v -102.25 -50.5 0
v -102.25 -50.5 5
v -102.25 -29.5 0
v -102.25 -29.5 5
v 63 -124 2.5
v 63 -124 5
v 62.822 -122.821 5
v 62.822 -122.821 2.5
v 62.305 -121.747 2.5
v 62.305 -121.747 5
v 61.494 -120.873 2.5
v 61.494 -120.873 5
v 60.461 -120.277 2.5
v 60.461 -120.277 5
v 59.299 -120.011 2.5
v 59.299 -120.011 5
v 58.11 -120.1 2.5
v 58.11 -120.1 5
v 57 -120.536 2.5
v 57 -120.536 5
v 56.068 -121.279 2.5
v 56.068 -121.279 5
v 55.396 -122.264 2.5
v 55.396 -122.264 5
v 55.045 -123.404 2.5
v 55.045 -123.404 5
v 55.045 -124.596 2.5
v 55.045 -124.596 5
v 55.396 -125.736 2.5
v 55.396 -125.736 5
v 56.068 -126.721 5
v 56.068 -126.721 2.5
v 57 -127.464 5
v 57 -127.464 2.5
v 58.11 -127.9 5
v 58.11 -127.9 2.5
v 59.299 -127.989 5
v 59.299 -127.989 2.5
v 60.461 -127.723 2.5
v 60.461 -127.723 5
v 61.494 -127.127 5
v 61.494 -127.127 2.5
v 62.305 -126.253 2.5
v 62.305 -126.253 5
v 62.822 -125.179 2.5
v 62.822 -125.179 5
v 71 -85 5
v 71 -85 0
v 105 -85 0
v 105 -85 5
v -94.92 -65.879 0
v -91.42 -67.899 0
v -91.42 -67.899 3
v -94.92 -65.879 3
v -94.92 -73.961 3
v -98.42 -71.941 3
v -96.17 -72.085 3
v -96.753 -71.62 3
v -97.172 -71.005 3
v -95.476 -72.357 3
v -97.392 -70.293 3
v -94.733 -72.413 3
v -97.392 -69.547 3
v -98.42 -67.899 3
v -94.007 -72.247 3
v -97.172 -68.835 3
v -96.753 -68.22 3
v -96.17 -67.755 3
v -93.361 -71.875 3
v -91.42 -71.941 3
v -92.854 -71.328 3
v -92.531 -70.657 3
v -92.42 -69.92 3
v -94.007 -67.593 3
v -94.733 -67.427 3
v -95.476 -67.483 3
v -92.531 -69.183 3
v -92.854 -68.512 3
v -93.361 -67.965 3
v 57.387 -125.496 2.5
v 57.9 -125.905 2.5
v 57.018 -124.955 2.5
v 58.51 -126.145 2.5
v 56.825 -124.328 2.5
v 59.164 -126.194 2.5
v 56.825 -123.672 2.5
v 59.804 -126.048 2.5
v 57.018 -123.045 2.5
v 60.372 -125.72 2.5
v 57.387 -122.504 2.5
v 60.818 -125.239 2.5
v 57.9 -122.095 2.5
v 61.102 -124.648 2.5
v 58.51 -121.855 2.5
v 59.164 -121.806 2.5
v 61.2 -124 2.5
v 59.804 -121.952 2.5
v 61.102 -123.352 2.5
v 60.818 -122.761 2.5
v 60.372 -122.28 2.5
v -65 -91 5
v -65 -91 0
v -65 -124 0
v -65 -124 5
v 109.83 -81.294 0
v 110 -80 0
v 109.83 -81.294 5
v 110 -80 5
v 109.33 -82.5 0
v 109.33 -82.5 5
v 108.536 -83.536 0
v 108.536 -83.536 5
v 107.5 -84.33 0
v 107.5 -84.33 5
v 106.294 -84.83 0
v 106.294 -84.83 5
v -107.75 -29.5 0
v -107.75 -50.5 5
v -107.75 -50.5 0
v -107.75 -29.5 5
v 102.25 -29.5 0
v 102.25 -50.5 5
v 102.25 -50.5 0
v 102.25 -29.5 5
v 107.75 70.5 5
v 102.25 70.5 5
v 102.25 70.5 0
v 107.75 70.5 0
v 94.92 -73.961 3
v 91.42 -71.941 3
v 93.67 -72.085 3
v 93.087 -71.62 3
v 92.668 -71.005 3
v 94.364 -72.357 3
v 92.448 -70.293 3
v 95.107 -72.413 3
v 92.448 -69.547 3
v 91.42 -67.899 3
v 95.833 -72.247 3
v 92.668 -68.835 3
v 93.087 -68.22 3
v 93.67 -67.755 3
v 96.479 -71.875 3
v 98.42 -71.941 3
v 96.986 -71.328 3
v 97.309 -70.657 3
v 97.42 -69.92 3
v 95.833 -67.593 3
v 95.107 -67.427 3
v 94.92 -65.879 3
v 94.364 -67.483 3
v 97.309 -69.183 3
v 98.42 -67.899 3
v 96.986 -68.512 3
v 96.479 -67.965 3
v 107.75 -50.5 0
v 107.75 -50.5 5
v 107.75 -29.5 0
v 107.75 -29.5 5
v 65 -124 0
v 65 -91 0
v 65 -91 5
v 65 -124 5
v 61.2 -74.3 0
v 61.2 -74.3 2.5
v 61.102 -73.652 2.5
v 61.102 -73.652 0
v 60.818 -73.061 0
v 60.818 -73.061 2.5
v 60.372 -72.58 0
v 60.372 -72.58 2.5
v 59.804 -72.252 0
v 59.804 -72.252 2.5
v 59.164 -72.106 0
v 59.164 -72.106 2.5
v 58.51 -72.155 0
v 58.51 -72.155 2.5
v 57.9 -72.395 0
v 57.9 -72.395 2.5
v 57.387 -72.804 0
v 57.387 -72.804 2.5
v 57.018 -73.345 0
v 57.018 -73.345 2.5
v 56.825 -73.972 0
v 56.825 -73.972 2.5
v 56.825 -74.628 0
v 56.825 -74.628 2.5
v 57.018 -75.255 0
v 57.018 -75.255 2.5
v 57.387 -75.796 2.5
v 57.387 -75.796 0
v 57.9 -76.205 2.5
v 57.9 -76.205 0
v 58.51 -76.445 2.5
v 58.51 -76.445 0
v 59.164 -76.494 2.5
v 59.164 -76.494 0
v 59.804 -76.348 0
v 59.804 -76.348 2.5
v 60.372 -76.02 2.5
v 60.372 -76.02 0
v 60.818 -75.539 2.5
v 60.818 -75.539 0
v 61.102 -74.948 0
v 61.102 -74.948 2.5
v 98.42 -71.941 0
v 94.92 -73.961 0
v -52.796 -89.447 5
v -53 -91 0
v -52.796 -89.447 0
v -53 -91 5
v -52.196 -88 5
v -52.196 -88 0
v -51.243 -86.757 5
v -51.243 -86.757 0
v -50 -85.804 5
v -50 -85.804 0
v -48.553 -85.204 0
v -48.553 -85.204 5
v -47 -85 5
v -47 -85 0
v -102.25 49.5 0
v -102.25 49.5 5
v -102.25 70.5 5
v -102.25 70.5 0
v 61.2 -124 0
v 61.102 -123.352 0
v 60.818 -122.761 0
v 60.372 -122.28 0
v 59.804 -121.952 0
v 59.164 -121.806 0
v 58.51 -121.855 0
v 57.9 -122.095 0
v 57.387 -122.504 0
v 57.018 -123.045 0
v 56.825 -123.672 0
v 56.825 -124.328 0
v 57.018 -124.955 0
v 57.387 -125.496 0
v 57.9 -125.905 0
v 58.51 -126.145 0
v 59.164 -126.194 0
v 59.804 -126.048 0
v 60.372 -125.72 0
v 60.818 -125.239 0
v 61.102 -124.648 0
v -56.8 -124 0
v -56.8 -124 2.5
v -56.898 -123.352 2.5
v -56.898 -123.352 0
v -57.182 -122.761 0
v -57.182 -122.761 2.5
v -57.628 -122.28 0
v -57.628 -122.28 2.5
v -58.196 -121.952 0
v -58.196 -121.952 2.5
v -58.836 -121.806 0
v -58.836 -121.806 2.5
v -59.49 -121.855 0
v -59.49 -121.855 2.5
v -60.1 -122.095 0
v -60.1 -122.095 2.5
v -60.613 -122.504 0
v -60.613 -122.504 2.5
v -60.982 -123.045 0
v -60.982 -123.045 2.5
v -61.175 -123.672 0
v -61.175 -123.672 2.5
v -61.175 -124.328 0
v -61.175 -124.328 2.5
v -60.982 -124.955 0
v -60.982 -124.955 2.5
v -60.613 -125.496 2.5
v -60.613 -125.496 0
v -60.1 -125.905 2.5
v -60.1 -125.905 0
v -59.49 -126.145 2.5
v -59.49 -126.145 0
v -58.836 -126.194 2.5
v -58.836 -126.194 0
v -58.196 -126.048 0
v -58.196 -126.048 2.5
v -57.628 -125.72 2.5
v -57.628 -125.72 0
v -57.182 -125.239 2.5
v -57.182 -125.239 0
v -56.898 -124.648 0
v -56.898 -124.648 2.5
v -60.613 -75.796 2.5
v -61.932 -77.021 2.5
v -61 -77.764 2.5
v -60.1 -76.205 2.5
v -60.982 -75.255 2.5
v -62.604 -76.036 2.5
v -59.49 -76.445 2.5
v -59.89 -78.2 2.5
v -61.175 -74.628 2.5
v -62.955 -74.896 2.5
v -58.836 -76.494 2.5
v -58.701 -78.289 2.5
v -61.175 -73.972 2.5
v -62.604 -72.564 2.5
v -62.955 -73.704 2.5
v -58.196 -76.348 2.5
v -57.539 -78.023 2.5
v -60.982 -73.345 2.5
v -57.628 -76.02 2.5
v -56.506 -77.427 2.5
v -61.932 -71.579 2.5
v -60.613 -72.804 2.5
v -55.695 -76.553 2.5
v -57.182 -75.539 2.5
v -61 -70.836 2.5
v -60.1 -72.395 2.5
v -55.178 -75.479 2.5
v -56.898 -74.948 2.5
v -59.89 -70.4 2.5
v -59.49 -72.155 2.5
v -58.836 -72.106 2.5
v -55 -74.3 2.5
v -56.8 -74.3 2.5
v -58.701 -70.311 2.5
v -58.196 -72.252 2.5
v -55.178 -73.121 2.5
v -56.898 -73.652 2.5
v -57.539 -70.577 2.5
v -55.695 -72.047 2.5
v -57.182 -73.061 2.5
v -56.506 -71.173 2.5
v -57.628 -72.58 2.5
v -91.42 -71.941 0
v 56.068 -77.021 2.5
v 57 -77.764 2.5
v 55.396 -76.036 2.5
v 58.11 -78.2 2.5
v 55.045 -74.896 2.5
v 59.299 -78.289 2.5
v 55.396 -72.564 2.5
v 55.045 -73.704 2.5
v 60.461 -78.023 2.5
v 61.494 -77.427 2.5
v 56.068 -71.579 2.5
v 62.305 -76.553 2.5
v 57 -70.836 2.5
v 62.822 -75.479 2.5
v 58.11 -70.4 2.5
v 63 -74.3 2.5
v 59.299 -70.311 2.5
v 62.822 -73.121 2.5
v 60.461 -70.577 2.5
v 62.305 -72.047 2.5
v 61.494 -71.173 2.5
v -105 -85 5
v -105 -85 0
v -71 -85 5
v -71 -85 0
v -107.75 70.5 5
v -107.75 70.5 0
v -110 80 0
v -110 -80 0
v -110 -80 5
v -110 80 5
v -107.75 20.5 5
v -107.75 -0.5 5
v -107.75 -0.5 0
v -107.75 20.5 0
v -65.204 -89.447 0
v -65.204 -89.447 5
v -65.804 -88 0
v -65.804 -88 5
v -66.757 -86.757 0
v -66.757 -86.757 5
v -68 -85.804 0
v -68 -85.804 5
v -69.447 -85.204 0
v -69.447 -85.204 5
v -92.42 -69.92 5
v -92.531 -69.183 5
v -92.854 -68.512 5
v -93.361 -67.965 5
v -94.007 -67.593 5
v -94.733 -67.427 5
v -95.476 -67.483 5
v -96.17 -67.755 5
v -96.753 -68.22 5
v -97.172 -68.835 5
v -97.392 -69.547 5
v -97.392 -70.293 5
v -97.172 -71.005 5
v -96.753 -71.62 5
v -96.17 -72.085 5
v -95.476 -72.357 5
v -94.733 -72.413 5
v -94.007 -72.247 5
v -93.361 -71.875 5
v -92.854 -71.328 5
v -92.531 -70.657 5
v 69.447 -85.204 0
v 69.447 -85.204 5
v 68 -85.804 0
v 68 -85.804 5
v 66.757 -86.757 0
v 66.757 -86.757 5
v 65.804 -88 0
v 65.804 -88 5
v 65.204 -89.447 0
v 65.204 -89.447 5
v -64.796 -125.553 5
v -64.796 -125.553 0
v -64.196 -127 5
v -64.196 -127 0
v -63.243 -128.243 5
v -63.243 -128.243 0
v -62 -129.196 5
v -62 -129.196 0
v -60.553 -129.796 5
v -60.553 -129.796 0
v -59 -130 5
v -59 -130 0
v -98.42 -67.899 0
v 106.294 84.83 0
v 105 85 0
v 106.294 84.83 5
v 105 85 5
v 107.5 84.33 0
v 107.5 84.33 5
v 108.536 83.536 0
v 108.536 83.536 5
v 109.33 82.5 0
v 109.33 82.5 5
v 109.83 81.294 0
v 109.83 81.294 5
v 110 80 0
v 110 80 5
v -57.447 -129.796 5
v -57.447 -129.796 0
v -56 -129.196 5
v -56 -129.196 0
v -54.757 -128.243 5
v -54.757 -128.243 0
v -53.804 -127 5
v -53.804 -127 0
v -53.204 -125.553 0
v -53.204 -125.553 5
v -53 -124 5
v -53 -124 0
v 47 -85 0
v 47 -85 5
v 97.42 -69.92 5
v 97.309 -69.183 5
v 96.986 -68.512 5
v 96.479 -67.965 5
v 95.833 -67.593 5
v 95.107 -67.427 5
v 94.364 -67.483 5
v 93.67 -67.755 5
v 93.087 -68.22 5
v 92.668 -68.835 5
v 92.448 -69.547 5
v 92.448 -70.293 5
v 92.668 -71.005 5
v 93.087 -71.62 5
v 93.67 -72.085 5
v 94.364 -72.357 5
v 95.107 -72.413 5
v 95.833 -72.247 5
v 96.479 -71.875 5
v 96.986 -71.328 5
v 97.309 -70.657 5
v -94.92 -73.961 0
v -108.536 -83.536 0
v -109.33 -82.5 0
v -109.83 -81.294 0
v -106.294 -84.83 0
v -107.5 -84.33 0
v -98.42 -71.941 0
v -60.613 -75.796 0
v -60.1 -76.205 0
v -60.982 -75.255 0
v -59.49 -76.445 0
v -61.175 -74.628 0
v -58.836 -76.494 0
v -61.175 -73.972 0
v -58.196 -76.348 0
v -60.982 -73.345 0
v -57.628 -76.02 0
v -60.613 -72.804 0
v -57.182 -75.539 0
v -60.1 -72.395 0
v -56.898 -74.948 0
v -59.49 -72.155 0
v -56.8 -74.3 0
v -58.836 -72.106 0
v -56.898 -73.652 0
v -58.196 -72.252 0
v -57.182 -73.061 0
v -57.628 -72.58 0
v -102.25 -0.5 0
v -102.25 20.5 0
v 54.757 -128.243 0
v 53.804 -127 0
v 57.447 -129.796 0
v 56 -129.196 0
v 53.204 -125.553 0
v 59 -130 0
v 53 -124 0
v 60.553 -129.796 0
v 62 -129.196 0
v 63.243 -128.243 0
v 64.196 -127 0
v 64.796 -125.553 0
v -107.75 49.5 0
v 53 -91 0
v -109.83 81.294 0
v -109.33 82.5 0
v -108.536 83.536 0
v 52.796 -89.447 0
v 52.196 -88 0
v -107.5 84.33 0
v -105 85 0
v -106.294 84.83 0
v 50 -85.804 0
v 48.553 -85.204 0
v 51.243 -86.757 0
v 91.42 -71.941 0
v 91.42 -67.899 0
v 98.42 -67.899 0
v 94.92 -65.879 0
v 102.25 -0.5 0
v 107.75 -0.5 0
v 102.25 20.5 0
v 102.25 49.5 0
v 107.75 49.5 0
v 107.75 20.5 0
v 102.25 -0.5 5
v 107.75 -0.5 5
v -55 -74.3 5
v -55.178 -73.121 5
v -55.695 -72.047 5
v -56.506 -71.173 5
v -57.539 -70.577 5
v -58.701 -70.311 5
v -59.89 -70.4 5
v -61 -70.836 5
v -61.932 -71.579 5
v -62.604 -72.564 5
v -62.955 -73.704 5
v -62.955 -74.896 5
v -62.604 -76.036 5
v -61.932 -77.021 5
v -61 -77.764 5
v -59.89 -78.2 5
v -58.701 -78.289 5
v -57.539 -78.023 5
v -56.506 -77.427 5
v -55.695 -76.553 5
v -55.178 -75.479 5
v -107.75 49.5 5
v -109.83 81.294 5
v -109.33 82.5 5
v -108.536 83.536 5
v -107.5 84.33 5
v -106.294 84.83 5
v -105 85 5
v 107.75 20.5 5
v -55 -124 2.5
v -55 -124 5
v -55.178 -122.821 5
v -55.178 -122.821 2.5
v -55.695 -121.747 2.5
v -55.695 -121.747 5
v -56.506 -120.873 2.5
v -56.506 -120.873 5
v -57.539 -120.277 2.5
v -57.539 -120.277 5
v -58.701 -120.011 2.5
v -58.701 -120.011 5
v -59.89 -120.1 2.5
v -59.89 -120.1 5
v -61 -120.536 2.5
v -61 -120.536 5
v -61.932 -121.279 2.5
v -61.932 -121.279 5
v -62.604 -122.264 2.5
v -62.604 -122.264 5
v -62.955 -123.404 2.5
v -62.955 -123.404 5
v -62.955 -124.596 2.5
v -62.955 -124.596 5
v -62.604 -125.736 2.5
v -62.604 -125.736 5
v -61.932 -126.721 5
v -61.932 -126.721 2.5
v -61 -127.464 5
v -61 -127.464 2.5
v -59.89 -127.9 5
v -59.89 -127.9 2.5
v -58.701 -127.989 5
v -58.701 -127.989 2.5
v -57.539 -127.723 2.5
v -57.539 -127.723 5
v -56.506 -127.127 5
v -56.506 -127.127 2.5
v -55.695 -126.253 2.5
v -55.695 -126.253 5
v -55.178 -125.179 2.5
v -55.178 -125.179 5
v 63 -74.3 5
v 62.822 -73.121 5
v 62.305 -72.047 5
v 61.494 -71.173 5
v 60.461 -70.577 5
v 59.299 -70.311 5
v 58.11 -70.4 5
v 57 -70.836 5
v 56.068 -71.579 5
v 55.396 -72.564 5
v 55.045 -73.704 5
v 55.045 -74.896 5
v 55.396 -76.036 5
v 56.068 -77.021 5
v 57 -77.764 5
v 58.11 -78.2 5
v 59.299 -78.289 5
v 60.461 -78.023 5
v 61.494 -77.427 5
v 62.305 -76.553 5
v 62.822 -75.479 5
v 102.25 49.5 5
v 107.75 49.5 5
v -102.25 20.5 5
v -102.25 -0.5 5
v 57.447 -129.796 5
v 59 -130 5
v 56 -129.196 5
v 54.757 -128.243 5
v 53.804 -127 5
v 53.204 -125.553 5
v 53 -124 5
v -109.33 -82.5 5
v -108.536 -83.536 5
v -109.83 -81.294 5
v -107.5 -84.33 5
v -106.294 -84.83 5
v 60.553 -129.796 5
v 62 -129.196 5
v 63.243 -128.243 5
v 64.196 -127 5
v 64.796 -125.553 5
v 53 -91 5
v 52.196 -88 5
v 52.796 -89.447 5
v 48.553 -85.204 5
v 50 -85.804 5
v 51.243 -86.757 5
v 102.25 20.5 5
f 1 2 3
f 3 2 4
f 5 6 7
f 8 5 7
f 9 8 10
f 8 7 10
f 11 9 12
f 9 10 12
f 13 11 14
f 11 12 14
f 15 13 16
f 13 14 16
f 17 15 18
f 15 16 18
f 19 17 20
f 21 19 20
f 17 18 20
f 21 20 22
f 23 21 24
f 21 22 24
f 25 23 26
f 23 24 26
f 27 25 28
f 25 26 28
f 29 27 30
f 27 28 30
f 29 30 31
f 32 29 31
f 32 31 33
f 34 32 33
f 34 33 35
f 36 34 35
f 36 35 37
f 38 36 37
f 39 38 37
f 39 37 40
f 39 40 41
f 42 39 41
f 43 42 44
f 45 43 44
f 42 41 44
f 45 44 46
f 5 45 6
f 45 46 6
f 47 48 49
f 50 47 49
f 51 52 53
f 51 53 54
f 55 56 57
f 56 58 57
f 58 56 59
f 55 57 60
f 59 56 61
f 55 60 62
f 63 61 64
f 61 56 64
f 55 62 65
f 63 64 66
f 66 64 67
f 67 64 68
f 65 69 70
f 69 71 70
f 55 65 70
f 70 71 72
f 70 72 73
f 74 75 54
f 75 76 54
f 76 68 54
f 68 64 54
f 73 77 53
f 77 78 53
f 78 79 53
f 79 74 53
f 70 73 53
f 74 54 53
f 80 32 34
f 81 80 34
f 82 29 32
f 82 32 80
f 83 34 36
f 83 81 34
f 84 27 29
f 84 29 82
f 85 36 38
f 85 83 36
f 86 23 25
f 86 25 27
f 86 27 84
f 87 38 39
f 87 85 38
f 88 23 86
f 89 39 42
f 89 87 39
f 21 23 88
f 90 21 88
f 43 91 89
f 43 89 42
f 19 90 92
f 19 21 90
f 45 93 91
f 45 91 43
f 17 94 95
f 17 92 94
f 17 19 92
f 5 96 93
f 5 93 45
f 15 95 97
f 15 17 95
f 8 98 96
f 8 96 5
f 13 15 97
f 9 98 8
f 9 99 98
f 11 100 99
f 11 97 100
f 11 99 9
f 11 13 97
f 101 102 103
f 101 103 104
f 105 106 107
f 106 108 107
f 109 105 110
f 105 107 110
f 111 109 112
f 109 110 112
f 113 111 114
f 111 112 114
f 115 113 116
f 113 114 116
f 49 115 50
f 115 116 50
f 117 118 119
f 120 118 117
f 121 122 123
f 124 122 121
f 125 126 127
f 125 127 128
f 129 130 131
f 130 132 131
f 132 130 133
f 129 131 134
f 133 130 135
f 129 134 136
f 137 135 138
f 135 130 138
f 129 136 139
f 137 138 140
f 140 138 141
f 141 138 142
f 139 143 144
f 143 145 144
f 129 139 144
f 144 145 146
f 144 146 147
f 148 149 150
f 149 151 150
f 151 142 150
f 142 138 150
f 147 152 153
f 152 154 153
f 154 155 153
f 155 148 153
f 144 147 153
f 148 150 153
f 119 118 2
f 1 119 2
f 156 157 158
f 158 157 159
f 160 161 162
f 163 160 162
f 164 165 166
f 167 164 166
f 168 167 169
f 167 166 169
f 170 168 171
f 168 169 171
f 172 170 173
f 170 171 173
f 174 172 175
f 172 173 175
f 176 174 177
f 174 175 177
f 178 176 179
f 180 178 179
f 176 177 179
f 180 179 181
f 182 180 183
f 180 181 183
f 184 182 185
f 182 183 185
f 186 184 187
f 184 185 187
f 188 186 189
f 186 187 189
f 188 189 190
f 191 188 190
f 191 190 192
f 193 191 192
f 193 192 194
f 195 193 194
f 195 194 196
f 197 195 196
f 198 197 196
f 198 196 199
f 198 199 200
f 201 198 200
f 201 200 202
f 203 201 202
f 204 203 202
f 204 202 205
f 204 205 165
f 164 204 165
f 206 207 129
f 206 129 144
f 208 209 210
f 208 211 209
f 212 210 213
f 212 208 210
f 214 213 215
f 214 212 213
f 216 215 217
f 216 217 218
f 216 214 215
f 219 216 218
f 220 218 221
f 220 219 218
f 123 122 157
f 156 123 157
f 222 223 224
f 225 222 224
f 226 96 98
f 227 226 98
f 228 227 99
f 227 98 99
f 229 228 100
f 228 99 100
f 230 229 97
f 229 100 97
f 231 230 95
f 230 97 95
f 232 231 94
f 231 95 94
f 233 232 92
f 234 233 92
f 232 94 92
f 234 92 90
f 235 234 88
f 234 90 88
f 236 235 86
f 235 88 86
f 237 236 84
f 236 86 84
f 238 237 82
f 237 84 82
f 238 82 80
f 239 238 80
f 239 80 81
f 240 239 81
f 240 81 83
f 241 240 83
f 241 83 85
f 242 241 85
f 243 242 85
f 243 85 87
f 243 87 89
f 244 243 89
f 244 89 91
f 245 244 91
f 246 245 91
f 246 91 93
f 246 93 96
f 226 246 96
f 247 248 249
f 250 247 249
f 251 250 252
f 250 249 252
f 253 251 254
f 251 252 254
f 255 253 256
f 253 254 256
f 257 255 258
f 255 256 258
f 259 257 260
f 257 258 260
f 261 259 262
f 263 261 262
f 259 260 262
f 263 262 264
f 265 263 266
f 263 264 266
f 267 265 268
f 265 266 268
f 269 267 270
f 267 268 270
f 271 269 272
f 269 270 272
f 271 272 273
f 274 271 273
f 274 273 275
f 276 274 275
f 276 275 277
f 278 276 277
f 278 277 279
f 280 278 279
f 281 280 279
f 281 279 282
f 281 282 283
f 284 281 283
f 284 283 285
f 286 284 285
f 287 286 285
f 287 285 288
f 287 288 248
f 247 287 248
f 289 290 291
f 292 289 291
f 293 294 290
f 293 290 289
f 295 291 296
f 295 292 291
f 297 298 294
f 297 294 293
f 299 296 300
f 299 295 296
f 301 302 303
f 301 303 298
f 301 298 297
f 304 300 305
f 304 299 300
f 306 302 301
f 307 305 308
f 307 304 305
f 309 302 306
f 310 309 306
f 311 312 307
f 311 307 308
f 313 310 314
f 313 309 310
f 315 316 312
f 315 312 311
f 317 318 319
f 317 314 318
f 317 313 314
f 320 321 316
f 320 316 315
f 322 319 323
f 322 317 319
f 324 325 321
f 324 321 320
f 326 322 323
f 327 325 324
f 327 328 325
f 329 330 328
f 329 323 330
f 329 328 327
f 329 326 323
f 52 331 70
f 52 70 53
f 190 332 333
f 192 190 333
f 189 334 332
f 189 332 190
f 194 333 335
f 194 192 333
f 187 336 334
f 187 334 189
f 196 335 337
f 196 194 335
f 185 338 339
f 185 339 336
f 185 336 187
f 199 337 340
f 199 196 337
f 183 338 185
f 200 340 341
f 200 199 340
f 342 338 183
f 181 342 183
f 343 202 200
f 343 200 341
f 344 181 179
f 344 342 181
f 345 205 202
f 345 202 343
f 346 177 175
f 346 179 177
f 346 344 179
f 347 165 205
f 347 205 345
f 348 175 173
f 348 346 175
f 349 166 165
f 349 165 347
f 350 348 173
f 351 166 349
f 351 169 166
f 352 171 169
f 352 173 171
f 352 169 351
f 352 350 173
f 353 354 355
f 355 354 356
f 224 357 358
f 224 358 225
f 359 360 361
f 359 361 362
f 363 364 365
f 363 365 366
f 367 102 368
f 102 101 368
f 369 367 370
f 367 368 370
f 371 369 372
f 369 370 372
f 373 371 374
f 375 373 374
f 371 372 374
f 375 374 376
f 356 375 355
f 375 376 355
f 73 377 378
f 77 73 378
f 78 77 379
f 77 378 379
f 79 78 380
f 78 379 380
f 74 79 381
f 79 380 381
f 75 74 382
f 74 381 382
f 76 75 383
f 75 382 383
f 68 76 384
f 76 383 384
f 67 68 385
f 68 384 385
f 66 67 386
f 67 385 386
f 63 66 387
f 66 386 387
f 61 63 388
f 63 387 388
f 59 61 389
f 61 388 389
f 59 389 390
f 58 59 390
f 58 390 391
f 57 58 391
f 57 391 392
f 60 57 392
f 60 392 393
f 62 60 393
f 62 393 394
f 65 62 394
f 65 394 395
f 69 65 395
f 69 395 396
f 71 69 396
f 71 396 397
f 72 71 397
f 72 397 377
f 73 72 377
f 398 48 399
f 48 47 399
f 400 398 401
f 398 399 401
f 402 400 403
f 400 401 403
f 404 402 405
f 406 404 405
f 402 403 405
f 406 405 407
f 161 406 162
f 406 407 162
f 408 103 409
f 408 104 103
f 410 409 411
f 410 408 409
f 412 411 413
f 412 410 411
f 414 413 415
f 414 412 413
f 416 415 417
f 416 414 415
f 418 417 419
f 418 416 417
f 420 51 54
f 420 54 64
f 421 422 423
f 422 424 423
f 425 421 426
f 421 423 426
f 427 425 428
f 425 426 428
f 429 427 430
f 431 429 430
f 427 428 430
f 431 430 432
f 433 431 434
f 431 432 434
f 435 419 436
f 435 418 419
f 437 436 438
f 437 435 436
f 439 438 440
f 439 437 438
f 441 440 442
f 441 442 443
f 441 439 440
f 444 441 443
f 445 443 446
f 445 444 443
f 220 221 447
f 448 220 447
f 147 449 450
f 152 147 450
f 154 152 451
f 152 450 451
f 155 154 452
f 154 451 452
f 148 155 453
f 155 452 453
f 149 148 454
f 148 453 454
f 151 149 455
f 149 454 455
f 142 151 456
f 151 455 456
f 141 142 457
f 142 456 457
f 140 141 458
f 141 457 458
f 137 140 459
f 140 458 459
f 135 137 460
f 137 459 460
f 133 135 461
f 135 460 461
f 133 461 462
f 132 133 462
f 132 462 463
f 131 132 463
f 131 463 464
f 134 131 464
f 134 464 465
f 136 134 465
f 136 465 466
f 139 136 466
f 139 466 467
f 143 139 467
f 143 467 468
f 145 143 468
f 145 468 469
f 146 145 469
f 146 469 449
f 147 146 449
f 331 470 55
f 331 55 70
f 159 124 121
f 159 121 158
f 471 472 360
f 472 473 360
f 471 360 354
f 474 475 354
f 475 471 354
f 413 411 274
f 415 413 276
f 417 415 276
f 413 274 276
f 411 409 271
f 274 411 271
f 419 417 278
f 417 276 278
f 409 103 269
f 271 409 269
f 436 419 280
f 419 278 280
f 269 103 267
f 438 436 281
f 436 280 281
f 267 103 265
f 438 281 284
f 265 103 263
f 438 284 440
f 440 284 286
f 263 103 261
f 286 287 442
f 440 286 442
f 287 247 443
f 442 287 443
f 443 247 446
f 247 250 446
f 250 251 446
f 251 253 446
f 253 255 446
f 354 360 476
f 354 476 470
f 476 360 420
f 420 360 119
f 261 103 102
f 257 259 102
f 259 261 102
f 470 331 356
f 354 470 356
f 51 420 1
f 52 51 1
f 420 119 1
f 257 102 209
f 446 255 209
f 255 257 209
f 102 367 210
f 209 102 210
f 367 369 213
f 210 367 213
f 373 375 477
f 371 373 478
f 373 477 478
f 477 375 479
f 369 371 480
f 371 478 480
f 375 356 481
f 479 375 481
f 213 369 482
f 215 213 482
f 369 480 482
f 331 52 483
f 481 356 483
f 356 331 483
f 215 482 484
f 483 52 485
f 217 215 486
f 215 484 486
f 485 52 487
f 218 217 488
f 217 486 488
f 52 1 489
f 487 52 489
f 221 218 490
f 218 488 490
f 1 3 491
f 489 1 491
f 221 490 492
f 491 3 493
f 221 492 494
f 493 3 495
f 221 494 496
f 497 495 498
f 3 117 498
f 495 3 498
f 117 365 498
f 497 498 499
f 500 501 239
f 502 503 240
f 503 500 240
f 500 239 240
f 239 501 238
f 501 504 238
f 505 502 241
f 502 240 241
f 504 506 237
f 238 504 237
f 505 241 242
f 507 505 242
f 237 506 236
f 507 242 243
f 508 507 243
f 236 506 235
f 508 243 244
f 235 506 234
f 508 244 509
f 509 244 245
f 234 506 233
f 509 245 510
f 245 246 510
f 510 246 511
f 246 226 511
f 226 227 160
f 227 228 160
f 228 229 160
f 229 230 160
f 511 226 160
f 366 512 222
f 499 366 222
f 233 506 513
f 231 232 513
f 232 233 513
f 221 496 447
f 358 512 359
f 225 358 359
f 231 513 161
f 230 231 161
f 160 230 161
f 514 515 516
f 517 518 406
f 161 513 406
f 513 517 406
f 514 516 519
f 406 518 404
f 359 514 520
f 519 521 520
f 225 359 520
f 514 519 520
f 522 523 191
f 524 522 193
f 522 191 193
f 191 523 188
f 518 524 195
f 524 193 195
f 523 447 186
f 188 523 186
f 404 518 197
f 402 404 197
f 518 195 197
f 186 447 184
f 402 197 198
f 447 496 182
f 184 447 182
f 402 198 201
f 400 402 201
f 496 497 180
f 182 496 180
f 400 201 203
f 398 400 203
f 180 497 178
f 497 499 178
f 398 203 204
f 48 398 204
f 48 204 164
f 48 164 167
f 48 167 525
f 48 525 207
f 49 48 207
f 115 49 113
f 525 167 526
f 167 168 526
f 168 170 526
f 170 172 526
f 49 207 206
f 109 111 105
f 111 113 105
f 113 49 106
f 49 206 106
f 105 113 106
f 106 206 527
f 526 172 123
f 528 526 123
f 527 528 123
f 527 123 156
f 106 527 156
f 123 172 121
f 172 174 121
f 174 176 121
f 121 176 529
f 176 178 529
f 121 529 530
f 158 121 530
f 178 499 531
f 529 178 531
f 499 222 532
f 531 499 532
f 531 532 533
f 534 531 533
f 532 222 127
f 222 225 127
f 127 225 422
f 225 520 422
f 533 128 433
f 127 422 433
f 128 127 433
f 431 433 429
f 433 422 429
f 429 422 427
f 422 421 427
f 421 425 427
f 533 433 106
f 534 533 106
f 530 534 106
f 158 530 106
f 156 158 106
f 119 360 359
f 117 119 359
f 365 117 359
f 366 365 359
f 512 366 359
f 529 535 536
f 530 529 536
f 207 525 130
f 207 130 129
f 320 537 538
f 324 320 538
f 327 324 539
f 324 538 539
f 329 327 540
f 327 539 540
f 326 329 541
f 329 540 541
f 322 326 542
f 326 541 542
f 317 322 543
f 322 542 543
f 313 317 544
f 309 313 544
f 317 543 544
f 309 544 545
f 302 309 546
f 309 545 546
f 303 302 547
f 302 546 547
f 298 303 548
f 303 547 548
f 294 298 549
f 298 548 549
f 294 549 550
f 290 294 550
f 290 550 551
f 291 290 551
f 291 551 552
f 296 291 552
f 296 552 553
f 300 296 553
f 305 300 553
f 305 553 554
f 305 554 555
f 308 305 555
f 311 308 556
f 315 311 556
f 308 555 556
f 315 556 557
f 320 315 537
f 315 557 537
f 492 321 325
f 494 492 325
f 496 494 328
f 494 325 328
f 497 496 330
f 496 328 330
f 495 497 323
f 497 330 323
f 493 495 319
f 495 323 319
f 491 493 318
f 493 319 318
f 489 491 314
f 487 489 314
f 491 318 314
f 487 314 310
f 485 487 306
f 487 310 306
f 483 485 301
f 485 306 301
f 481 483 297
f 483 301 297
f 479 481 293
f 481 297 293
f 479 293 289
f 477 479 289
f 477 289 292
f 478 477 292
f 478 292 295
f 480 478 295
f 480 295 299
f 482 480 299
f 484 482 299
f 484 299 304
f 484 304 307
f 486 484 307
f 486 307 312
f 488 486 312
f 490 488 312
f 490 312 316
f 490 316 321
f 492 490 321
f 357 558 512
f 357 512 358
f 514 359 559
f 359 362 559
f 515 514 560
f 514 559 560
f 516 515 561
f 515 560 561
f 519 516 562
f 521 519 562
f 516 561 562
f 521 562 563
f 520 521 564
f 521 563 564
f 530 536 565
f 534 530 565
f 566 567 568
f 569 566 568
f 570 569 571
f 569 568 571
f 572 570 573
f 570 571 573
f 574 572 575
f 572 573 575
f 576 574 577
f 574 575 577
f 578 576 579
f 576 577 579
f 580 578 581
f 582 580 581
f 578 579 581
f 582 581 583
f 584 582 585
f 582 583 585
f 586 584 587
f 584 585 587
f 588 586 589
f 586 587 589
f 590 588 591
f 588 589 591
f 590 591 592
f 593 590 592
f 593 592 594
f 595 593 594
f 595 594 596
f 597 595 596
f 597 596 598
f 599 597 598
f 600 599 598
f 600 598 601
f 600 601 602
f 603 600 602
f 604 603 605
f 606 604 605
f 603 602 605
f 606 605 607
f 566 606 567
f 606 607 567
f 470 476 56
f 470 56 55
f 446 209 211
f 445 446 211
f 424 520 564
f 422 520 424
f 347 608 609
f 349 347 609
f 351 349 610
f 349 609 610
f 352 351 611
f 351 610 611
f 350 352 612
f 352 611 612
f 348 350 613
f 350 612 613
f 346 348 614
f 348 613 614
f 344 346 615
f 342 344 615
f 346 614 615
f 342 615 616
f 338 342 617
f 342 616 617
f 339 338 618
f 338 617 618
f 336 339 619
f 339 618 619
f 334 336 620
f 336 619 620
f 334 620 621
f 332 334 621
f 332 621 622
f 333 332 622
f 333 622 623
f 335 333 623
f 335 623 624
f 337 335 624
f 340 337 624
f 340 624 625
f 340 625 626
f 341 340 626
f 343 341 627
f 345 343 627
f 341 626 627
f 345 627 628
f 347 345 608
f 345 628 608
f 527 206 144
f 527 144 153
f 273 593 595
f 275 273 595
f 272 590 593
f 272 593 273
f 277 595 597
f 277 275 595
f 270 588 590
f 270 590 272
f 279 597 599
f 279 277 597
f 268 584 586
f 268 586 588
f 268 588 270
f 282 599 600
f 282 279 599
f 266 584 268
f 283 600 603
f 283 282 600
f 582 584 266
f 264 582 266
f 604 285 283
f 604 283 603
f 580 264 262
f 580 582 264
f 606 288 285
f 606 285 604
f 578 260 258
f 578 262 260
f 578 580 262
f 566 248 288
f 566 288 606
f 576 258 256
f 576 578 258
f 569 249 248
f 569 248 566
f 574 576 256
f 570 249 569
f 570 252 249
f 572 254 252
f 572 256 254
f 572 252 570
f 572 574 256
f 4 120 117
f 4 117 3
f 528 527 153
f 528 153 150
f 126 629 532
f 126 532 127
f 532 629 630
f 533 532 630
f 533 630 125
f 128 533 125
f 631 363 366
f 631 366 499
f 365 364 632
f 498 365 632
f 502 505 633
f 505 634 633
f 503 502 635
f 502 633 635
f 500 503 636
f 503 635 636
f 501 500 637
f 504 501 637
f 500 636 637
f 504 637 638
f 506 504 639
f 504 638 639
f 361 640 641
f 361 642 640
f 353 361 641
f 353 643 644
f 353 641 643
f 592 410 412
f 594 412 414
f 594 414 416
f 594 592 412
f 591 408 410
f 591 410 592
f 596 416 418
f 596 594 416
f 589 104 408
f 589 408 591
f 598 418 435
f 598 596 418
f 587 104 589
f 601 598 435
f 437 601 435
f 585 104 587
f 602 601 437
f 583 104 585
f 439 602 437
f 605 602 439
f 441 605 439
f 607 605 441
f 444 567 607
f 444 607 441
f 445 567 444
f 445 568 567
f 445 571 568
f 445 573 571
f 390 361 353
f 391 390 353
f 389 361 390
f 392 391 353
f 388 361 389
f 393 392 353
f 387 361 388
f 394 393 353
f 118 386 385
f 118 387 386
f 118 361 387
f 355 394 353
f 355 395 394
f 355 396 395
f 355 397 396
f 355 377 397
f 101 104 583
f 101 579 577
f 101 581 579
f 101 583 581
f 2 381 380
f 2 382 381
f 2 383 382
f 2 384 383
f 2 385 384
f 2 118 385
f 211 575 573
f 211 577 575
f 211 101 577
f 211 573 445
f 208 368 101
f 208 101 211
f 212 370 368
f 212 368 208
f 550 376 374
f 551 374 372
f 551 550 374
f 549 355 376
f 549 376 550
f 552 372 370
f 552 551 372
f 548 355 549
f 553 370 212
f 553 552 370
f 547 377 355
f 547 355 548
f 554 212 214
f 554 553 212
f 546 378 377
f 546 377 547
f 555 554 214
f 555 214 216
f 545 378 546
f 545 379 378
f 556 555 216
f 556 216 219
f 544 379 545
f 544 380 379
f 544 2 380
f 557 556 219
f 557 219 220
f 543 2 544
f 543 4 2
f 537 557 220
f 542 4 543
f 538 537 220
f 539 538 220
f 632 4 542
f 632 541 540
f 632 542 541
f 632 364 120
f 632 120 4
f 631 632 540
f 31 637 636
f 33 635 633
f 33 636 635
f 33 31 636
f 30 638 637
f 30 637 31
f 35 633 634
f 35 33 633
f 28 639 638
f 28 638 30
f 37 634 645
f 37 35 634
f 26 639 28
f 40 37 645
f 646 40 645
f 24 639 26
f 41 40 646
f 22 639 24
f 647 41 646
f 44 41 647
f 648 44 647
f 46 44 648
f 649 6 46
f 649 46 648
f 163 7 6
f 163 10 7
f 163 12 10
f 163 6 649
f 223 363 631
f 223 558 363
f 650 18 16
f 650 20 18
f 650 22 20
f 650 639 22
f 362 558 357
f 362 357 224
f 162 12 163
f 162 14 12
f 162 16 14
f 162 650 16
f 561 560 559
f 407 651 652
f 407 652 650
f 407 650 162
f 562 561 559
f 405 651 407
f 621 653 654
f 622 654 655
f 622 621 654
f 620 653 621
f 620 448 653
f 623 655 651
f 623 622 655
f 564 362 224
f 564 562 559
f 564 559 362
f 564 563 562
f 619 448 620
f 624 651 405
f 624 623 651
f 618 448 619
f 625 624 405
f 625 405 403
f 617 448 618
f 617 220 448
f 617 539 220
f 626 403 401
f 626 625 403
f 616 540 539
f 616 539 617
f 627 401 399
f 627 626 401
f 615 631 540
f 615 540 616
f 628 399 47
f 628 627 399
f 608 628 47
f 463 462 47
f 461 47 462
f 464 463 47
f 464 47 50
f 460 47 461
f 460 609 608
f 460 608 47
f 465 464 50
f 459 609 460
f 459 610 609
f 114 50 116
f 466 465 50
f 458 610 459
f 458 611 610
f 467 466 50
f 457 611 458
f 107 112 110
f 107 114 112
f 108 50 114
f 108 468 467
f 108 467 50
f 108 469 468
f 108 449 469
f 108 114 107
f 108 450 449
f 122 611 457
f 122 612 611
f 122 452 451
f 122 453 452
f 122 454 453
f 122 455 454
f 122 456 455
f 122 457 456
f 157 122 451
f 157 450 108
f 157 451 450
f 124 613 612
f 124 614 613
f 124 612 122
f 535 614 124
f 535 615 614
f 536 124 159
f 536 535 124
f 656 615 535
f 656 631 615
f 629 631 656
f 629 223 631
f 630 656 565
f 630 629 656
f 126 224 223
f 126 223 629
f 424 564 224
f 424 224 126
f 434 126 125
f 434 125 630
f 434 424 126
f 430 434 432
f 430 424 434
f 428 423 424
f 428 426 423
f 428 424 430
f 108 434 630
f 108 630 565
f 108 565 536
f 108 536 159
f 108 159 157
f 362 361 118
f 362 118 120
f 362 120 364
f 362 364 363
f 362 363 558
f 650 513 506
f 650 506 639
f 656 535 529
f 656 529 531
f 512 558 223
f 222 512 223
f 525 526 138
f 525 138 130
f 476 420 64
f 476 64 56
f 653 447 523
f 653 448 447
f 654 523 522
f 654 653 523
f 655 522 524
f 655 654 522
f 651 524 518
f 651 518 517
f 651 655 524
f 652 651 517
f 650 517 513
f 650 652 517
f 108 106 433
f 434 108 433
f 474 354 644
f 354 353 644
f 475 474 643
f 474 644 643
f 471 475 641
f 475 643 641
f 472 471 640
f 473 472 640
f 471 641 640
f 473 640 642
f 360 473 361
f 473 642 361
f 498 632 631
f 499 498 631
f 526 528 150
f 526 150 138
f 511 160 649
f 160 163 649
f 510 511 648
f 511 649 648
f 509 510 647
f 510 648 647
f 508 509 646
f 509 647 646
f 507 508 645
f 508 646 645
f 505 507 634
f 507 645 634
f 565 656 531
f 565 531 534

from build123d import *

# Parameters (mm, degrees)
F0_W      = 220
F0_H      = 170
F0_W_2    = 200
F0_H_2    = 150
F1_DEPTH  = 5
F2_W      = 5.5
F2_H      = 21
F3_DEPTH  = 25
F4_W      = 12
F4_H      = 5
F5_DEPTH  = 45
F6_R      = 2.2
F7_DEPTH  = 25
F8_R      = 5.99999
F9_R      = 6
F10_R     = 4
F11_DEPTH = 2.5
F13_R     = 5
F15_DEPTH = 3
F12_R     = 2.5
F16_DEPTH = 3


# Not quite as in the source:
# - a fillet or chamfer is up to 0.001 mm smaller than in the source, because OpenCascade refuses the exact size


with BuildPart() as f1:
    # F0 (on Top) → F1 (new body)
    with BuildSketch(Plane.XY):
        Rectangle(F0_W, F0_H)
        Rectangle(F0_W_2, F0_H_2, mode=Mode.SUBTRACT)
        Rectangle(F0_W_2, F0_H_2)
    extrude(amount=F1_DEPTH)

    # F2 (on face) → F3 (cut)
    with BuildSketch(Plane.XY.offset(5)):
        with Locations((-105, 60)):
            Rectangle(F2_W, F2_H)
        with Locations((-105, 10)):
            Rectangle(F2_W, F2_H)
        with Locations((-105, -40)):
            Rectangle(F2_W, F2_H)
        with Locations((105, 60)):
            Rectangle(F2_W, F2_H)
        with Locations((105, 10)):
            Rectangle(F2_W, F2_H)
        with Locations((105, -40)):
            Rectangle(F2_W, F2_H)
    extrude(amount=-F3_DEPTH, mode=Mode.SUBTRACT)

    # F4 (on face) → F5 (join)
    with BuildSketch(Plane.XZ.offset(85)):
        with Locations((59, 2.5)):
            Rectangle(F4_W, F4_H)
        with Locations((-59, 2.5)):
            Rectangle(F4_W, F4_H)
    extrude(amount=F5_DEPTH)

    # F6 (on face) → F7 (cut)
    with BuildSketch(Plane.XY.offset(5)):
        with Locations((-59, -74.3)):
            Circle(F6_R)
        with Locations((-59, -124)):
            Circle(F6_R)
        with Locations((59, -74.3)):
            Circle(F6_R)
        with Locations((59, -124)):
            Circle(F6_R)
    extrude(amount=-F7_DEPTH, mode=Mode.SUBTRACT)

    # F8 (radius 6 in the source; OpenCascade refuses exactly that, so slightly less here)
    f8_edges = [f1.edges().sort_by_distance(p)[0] for p in [
        (-65, -130, 2.5),
        (-53, -130, 2.5),
        (53, -130, 2.5),
        (65, -130, 2.5),
    ]]
    fillet(f8_edges, radius=F8_R)

    # F9
    f9_edges = [f1.edges().sort_by_distance(p)[0] for p in [
        (-65, -85, 2.5),
        (-53, -85, 2.5),
        (53, -85, 2.5),
        (65, -85, 2.5),
    ]]
    fillet(f9_edges, radius=F9_R)

    # F10 (on face) → F11 (cut)
    with BuildSketch(Plane.XY.offset(5)):
        with Locations((-59, -124)):
            Circle(F10_R)
        with Locations((-59, -74.3)):
            Circle(F10_R)
        with Locations((59, -74.3)):
            Circle(F10_R)
        with Locations((59, -124)):
            Circle(F10_R)
    extrude(amount=-F11_DEPTH, mode=Mode.SUBTRACT)

    # F13
    f13_edges = [f1.edges().sort_by_distance(p)[0] for p in [
        (-110, -85, 2.5),
        (110, -85, 2.5),
        (110, 85, 2.5),
        (-110, 85, 2.5),
    ]]
    fillet(f13_edges, radius=F13_R)

    # F14 (on face) → F15 (cut)
    with BuildSketch(Plane.XY):
        Polygon((-98.42, -67.8992740578), (-98.42, -71.9407259422), (-94.92, -73.9614518843), (-91.42, -71.9407259422), (-91.42, -67.8992740578), (-94.92, -65.8785481157), align=None)
        Polygon((98.42, -71.9407259422), (98.42, -67.8992740578), (94.92, -65.8785481157), (91.42, -67.8992740578), (91.42, -71.9407259422), (94.92, -73.9614518843), align=None)
    extrude(amount=F15_DEPTH, mode=Mode.SUBTRACT)

    # F12 (on face) → F16 (cut)
    with BuildSketch(Plane.XY.offset(5)):
        with Locations((94.92, -69.92)):
            Circle(F12_R)
        with Locations((-94.92, -69.92)):
            Circle(F12_R)
    extrude(amount=-F16_DEPTH, mode=Mode.SUBTRACT)


solid = f1.part
